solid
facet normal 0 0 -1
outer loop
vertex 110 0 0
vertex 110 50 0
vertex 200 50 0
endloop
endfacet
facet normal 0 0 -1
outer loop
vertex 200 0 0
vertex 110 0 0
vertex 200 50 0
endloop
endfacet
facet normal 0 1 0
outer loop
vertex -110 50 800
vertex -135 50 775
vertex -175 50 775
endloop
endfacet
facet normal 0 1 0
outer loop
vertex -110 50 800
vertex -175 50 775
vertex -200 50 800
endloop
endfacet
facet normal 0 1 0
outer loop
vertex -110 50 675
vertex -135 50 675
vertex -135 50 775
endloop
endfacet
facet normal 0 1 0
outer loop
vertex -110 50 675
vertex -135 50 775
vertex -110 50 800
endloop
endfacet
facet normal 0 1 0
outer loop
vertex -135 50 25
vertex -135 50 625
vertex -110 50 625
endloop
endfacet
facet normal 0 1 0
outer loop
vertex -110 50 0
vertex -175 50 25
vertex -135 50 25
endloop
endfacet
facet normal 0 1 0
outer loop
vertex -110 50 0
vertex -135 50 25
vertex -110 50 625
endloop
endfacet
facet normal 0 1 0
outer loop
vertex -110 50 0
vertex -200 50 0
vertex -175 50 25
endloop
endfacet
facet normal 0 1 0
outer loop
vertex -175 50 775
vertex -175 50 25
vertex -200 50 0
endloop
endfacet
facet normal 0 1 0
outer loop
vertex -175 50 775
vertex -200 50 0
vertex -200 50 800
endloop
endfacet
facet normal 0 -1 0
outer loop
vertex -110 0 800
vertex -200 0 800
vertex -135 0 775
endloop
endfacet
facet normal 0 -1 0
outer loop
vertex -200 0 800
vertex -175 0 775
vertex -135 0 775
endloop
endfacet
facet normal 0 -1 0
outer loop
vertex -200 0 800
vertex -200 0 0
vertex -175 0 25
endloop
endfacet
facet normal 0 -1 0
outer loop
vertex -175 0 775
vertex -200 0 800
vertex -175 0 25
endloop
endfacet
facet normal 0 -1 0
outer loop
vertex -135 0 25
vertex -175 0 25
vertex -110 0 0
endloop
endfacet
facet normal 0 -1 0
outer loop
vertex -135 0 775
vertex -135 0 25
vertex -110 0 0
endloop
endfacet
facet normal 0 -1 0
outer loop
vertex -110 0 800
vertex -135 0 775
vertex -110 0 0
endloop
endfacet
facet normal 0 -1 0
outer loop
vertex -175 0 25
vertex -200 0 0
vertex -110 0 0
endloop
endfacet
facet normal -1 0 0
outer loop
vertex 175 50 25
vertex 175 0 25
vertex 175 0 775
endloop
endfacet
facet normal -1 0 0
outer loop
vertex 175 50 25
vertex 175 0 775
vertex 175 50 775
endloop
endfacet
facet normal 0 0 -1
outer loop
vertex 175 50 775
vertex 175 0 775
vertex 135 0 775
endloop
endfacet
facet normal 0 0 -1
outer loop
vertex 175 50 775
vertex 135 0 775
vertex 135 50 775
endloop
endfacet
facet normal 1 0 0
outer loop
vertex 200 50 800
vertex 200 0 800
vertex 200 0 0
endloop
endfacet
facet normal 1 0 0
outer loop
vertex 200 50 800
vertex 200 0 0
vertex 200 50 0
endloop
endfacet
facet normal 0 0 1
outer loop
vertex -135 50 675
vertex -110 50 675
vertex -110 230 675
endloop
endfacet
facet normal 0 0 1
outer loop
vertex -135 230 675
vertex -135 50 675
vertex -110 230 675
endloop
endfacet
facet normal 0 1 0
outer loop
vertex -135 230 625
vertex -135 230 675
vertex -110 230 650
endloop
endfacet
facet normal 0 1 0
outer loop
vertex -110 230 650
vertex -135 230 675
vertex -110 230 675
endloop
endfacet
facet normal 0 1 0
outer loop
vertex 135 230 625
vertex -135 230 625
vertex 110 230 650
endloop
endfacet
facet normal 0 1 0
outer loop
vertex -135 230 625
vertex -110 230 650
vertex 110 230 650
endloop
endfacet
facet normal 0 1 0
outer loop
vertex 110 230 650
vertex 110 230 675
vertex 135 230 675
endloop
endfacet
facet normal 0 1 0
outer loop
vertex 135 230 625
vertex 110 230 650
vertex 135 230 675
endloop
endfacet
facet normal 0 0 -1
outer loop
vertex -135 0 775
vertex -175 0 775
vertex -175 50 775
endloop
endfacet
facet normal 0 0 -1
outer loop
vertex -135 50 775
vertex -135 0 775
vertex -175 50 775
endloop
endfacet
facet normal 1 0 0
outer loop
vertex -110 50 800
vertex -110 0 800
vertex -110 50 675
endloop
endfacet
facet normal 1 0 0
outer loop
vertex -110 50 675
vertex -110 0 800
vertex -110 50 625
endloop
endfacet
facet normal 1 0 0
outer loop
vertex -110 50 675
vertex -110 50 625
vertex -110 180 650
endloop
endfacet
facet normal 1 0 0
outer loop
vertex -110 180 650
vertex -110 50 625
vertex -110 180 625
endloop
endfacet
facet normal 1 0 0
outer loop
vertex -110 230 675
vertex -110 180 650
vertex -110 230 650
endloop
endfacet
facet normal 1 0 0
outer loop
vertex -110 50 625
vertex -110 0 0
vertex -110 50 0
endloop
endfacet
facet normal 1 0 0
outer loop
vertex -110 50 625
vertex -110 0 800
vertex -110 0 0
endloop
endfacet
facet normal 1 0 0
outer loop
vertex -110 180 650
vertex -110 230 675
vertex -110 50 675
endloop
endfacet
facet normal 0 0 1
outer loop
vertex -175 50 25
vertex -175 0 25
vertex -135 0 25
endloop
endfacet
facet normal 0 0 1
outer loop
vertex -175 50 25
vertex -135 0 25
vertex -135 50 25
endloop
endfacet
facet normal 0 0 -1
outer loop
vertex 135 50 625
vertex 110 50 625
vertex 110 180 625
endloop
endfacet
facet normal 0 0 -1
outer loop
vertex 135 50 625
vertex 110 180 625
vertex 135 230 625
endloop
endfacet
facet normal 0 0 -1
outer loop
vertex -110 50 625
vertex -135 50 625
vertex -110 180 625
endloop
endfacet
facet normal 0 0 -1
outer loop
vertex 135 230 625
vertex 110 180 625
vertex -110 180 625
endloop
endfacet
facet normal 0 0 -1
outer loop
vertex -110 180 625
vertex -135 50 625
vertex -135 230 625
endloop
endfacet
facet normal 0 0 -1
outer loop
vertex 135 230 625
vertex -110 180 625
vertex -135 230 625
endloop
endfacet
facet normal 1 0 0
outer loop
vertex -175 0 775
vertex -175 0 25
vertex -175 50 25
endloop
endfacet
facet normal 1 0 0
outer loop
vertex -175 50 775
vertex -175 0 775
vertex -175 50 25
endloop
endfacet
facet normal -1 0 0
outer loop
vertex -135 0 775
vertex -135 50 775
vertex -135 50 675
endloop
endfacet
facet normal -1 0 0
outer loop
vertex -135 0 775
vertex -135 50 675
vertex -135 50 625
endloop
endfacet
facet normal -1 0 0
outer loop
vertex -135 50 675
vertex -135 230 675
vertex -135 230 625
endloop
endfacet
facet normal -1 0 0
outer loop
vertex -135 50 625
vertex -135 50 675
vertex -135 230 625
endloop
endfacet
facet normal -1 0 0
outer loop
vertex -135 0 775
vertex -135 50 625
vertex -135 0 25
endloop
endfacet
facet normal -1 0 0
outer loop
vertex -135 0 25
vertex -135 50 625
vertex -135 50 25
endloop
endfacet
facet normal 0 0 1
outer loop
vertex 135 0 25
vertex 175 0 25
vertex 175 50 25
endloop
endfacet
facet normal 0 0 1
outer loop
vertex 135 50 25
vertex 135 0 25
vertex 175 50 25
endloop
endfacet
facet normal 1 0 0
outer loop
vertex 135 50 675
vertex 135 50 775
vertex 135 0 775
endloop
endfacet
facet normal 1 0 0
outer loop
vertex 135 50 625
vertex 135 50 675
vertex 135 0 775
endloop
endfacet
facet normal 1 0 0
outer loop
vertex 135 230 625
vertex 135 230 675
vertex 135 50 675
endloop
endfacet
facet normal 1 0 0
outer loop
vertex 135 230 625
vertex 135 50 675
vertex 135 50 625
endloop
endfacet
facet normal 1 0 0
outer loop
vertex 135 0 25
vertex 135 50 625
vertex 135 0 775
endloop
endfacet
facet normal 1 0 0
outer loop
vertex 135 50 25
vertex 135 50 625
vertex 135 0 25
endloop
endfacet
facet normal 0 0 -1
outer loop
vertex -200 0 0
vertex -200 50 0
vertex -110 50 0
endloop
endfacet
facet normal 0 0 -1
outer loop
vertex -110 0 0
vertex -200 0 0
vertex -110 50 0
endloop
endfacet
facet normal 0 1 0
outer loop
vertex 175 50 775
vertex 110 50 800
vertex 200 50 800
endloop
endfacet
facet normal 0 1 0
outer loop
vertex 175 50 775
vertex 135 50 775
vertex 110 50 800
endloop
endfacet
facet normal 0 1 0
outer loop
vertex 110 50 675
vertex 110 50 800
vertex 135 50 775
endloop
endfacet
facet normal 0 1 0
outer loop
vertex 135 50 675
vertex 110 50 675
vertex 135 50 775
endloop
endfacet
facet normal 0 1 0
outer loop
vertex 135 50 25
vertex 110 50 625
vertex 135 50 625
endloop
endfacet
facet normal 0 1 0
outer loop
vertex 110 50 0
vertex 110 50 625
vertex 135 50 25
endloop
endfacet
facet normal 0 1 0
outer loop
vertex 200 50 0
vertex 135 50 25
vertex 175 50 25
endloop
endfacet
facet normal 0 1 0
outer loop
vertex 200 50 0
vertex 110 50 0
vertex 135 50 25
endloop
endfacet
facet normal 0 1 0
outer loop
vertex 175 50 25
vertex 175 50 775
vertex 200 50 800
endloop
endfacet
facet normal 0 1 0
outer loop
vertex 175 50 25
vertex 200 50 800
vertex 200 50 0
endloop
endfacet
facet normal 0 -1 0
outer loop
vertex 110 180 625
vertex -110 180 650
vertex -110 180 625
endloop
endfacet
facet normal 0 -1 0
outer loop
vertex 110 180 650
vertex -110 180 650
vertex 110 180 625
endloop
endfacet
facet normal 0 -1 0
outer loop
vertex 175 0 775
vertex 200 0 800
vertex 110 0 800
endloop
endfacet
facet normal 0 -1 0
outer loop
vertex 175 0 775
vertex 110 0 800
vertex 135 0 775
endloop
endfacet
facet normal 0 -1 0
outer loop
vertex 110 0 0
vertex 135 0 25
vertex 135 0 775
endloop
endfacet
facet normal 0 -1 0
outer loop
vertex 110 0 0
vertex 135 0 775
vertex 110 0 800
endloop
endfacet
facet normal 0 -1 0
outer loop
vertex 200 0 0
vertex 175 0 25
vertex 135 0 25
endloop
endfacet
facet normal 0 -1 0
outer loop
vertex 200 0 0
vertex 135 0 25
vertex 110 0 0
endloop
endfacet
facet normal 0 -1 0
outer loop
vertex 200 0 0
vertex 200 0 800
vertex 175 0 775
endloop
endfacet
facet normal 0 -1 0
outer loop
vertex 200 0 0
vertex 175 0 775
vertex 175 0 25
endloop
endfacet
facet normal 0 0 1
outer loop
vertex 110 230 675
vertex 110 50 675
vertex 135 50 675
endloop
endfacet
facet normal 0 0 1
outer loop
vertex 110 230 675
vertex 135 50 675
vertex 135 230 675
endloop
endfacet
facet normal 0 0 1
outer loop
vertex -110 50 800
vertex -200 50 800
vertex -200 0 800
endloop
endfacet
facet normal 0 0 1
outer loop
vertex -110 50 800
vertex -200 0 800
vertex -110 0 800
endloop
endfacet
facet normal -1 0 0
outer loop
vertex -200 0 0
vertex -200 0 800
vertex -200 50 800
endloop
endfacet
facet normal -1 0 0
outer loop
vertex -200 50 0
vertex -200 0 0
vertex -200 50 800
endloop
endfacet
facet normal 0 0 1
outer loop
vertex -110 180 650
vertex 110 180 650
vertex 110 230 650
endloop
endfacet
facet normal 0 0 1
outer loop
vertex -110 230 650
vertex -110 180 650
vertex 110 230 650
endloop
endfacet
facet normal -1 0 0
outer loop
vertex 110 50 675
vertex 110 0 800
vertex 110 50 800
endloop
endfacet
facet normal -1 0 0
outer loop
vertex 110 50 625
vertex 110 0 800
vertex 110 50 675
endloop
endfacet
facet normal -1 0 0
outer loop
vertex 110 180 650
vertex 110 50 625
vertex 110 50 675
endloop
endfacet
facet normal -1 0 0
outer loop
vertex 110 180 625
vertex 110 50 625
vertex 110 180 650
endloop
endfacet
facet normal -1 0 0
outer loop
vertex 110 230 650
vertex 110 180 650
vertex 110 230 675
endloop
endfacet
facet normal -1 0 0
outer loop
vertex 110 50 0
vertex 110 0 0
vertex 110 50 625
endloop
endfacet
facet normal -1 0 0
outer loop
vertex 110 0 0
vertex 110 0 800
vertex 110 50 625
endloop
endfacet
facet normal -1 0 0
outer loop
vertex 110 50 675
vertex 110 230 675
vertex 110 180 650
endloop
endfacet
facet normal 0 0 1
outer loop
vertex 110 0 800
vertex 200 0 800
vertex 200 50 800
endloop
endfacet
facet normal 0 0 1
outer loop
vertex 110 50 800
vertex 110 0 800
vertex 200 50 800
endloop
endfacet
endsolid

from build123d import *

# Parameters (mm, degrees)
CROQUIS2_W                 = 25
CROQUIS2_H                 = 50
SALIENTE_EXTRUIR1_DEPTH    = 800
SALIENTE_EXTRUIR1_2_DEPTH  = 800
SALIENTE_EXTRUIR1_3_DEPTH  = 800
SALIENTE_EXTRUIR1_4_DEPTH  = 800
CROQUIS3_W                 = 25
CROQUIS3_H                 = 50
SALIENTE_EXTRUIR2_DEPTH    = 230
CROQUIS4_W                 = 25
CROQUIS4_H                 = 50
SALIENTE_EXTRUIR3_DEPTH    = 65
CROQUIS5_W                 = 25
CROQUIS5_H                 = 50
SALIENTE_EXTRUIR4_DEPTH    = 65
CROQUIS6_W                 = 25
CROQUIS6_H                 = 50
SALIENTE_EXTRUIR5_DEPTH    = 800
CROQUIS7_W                 = 25
CROQUIS7_H                 = 50
SALIENTE_EXTRUIR6_DEPTH    = 270
CROQUIS8_W                 = 25
CROQUIS8_H                 = 50
SALIENTE_EXTRUIR7_DEPTH    = 180
CROQUIS9_W                 = 625
CROQUIS9_H                 = 180
CROQUIS9_W_2               = 125
CORTAR_EXTRUIR1_DEPTH      = 201
CORTAR_EXTRUIR1_DEPTH_BACK = 201


with BuildPart() as part:
    # Croquis2 → Saliente-Extruir1 (new body)
    with BuildSketch(Plane.XY):
        with Locations((-187.5, 25)):
            Rectangle(CROQUIS2_W, CROQUIS2_H)
    extrude(amount=SALIENTE_EXTRUIR1_DEPTH)



with BuildPart() as body_2:
    # Croquis2 → Saliente-Extruir1 2 (new body)
    with BuildSketch(Plane.XY):
        with Locations((187.5, 25)):
            Rectangle(CROQUIS2_W, CROQUIS2_H)
    extrude(amount=SALIENTE_EXTRUIR1_2_DEPTH)


with BuildPart() as body_3:
    # Croquis2 → Saliente-Extruir1 3 (new body)
    with BuildSketch(Plane.XY):
        with Locations((-122.5, 25)):
            Rectangle(CROQUIS2_W, CROQUIS2_H)
    extrude(amount=SALIENTE_EXTRUIR1_3_DEPTH)



with BuildPart() as body_4:
    # Croquis2 → Saliente-Extruir1 4 (new body)
    with BuildSketch(Plane.XY):
        with Locations((122.5, 25)):
            Rectangle(CROQUIS2_W, CROQUIS2_H)
    extrude(amount=SALIENTE_EXTRUIR1_4_DEPTH)


with BuildPart() as body_3_1:
    add(body_3.part)

    add(body_4.part)  # Saliente-Extruir2 merges body 4
    # Croquis3 → Saliente-Extruir2 (add)
    with BuildSketch(Plane.XZ):
        with Locations((-122.5, 775)):
            Rectangle(CROQUIS3_W, CROQUIS3_H)
        with Locations((122.5, 775)):
            Rectangle(CROQUIS3_W, CROQUIS3_H)
        with Locations((-122.5, 25)):
            Rectangle(CROQUIS3_W, CROQUIS3_H)
        with Locations((122.5, 25)):
            Rectangle(CROQUIS3_W, CROQUIS3_H)
    extrude(amount=-SALIENTE_EXTRUIR2_DEPTH)


with BuildPart() as part_1:
    add(part.part)

    add(body_3_1.part)  # Saliente-Extruir3 merges body 3
    # Croquis4 → Saliente-Extruir3 (add)
    with BuildSketch(Plane.ZY.offset(200)):
        with Locations((12.5, 25)):
            Rectangle(CROQUIS4_W, CROQUIS4_H)
        with Locations((787.5, 25)):
            Rectangle(CROQUIS4_W, CROQUIS4_H)
    extrude(amount=-SALIENTE_EXTRUIR3_DEPTH)


    add(body_2.part)  # Saliente-Extruir4 merges body 2
    # Croquis5 → Saliente-Extruir4 (add)
    with BuildSketch(Plane(origin=(200, 0, 0), x_dir=(0, 0, -1), z_dir=(1, 0, 0))):
        with Locations((-787.5, 25)):
            Rectangle(CROQUIS5_W, CROQUIS5_H)
        with Locations((-12.5, 25)):
            Rectangle(CROQUIS5_W, CROQUIS5_H)
    extrude(amount=-SALIENTE_EXTRUIR4_DEPTH)

    # Croquis6 → Saliente-Extruir5 (add)
    with BuildSketch(Plane.XY.offset(800)):
        with Locations((-122.5, 205)):
            Rectangle(CROQUIS6_W, CROQUIS6_H)
        with Locations((122.5, 205)):
            Rectangle(CROQUIS6_W, CROQUIS6_H)
    extrude(amount=-SALIENTE_EXTRUIR5_DEPTH)

    # Croquis7 → Saliente-Extruir6 (add)
    with BuildSketch(Plane(origin=(135, 0, 0), x_dir=(0, 0, -1), z_dir=(1, 0, 0))):
        with Locations((-637.5, 205)):
            Rectangle(CROQUIS7_W, CROQUIS7_H)
    extrude(amount=-SALIENTE_EXTRUIR6_DEPTH)

    # Croquis8 → Saliente-Extruir7 (add)
    with BuildSketch(Plane(origin=(0, 230, 0), x_dir=(1, 0, 0), z_dir=(0, 1, 0))):
        with Locations((-122.5, -650)):
            Rectangle(CROQUIS8_W, CROQUIS8_H)
        with Locations((122.5, -650)):
            Rectangle(CROQUIS8_W, CROQUIS8_H)
    extrude(amount=-SALIENTE_EXTRUIR7_DEPTH)

    # Croquis9 → Cortar-Extruir1 (cut, two sides)
    with BuildSketch(Plane(origin=(0, 0, 0), x_dir=(0, 0, -1), z_dir=(1, 0, 0))) as cortar_extruir1_sk:
        with Locations((-312.5, 140)):
            Rectangle(CROQUIS9_W, CROQUIS9_H)
        with Locations((-737.5, 140)):
            Rectangle(CROQUIS9_W_2, CROQUIS9_H)
    extrude(amount=CORTAR_EXTRUIR1_DEPTH, mode=Mode.SUBTRACT)
    extrude(cortar_extruir1_sk.sketch, amount=-CORTAR_EXTRUIR1_DEPTH_BACK, mode=Mode.SUBTRACT)


solid = part_1.part
